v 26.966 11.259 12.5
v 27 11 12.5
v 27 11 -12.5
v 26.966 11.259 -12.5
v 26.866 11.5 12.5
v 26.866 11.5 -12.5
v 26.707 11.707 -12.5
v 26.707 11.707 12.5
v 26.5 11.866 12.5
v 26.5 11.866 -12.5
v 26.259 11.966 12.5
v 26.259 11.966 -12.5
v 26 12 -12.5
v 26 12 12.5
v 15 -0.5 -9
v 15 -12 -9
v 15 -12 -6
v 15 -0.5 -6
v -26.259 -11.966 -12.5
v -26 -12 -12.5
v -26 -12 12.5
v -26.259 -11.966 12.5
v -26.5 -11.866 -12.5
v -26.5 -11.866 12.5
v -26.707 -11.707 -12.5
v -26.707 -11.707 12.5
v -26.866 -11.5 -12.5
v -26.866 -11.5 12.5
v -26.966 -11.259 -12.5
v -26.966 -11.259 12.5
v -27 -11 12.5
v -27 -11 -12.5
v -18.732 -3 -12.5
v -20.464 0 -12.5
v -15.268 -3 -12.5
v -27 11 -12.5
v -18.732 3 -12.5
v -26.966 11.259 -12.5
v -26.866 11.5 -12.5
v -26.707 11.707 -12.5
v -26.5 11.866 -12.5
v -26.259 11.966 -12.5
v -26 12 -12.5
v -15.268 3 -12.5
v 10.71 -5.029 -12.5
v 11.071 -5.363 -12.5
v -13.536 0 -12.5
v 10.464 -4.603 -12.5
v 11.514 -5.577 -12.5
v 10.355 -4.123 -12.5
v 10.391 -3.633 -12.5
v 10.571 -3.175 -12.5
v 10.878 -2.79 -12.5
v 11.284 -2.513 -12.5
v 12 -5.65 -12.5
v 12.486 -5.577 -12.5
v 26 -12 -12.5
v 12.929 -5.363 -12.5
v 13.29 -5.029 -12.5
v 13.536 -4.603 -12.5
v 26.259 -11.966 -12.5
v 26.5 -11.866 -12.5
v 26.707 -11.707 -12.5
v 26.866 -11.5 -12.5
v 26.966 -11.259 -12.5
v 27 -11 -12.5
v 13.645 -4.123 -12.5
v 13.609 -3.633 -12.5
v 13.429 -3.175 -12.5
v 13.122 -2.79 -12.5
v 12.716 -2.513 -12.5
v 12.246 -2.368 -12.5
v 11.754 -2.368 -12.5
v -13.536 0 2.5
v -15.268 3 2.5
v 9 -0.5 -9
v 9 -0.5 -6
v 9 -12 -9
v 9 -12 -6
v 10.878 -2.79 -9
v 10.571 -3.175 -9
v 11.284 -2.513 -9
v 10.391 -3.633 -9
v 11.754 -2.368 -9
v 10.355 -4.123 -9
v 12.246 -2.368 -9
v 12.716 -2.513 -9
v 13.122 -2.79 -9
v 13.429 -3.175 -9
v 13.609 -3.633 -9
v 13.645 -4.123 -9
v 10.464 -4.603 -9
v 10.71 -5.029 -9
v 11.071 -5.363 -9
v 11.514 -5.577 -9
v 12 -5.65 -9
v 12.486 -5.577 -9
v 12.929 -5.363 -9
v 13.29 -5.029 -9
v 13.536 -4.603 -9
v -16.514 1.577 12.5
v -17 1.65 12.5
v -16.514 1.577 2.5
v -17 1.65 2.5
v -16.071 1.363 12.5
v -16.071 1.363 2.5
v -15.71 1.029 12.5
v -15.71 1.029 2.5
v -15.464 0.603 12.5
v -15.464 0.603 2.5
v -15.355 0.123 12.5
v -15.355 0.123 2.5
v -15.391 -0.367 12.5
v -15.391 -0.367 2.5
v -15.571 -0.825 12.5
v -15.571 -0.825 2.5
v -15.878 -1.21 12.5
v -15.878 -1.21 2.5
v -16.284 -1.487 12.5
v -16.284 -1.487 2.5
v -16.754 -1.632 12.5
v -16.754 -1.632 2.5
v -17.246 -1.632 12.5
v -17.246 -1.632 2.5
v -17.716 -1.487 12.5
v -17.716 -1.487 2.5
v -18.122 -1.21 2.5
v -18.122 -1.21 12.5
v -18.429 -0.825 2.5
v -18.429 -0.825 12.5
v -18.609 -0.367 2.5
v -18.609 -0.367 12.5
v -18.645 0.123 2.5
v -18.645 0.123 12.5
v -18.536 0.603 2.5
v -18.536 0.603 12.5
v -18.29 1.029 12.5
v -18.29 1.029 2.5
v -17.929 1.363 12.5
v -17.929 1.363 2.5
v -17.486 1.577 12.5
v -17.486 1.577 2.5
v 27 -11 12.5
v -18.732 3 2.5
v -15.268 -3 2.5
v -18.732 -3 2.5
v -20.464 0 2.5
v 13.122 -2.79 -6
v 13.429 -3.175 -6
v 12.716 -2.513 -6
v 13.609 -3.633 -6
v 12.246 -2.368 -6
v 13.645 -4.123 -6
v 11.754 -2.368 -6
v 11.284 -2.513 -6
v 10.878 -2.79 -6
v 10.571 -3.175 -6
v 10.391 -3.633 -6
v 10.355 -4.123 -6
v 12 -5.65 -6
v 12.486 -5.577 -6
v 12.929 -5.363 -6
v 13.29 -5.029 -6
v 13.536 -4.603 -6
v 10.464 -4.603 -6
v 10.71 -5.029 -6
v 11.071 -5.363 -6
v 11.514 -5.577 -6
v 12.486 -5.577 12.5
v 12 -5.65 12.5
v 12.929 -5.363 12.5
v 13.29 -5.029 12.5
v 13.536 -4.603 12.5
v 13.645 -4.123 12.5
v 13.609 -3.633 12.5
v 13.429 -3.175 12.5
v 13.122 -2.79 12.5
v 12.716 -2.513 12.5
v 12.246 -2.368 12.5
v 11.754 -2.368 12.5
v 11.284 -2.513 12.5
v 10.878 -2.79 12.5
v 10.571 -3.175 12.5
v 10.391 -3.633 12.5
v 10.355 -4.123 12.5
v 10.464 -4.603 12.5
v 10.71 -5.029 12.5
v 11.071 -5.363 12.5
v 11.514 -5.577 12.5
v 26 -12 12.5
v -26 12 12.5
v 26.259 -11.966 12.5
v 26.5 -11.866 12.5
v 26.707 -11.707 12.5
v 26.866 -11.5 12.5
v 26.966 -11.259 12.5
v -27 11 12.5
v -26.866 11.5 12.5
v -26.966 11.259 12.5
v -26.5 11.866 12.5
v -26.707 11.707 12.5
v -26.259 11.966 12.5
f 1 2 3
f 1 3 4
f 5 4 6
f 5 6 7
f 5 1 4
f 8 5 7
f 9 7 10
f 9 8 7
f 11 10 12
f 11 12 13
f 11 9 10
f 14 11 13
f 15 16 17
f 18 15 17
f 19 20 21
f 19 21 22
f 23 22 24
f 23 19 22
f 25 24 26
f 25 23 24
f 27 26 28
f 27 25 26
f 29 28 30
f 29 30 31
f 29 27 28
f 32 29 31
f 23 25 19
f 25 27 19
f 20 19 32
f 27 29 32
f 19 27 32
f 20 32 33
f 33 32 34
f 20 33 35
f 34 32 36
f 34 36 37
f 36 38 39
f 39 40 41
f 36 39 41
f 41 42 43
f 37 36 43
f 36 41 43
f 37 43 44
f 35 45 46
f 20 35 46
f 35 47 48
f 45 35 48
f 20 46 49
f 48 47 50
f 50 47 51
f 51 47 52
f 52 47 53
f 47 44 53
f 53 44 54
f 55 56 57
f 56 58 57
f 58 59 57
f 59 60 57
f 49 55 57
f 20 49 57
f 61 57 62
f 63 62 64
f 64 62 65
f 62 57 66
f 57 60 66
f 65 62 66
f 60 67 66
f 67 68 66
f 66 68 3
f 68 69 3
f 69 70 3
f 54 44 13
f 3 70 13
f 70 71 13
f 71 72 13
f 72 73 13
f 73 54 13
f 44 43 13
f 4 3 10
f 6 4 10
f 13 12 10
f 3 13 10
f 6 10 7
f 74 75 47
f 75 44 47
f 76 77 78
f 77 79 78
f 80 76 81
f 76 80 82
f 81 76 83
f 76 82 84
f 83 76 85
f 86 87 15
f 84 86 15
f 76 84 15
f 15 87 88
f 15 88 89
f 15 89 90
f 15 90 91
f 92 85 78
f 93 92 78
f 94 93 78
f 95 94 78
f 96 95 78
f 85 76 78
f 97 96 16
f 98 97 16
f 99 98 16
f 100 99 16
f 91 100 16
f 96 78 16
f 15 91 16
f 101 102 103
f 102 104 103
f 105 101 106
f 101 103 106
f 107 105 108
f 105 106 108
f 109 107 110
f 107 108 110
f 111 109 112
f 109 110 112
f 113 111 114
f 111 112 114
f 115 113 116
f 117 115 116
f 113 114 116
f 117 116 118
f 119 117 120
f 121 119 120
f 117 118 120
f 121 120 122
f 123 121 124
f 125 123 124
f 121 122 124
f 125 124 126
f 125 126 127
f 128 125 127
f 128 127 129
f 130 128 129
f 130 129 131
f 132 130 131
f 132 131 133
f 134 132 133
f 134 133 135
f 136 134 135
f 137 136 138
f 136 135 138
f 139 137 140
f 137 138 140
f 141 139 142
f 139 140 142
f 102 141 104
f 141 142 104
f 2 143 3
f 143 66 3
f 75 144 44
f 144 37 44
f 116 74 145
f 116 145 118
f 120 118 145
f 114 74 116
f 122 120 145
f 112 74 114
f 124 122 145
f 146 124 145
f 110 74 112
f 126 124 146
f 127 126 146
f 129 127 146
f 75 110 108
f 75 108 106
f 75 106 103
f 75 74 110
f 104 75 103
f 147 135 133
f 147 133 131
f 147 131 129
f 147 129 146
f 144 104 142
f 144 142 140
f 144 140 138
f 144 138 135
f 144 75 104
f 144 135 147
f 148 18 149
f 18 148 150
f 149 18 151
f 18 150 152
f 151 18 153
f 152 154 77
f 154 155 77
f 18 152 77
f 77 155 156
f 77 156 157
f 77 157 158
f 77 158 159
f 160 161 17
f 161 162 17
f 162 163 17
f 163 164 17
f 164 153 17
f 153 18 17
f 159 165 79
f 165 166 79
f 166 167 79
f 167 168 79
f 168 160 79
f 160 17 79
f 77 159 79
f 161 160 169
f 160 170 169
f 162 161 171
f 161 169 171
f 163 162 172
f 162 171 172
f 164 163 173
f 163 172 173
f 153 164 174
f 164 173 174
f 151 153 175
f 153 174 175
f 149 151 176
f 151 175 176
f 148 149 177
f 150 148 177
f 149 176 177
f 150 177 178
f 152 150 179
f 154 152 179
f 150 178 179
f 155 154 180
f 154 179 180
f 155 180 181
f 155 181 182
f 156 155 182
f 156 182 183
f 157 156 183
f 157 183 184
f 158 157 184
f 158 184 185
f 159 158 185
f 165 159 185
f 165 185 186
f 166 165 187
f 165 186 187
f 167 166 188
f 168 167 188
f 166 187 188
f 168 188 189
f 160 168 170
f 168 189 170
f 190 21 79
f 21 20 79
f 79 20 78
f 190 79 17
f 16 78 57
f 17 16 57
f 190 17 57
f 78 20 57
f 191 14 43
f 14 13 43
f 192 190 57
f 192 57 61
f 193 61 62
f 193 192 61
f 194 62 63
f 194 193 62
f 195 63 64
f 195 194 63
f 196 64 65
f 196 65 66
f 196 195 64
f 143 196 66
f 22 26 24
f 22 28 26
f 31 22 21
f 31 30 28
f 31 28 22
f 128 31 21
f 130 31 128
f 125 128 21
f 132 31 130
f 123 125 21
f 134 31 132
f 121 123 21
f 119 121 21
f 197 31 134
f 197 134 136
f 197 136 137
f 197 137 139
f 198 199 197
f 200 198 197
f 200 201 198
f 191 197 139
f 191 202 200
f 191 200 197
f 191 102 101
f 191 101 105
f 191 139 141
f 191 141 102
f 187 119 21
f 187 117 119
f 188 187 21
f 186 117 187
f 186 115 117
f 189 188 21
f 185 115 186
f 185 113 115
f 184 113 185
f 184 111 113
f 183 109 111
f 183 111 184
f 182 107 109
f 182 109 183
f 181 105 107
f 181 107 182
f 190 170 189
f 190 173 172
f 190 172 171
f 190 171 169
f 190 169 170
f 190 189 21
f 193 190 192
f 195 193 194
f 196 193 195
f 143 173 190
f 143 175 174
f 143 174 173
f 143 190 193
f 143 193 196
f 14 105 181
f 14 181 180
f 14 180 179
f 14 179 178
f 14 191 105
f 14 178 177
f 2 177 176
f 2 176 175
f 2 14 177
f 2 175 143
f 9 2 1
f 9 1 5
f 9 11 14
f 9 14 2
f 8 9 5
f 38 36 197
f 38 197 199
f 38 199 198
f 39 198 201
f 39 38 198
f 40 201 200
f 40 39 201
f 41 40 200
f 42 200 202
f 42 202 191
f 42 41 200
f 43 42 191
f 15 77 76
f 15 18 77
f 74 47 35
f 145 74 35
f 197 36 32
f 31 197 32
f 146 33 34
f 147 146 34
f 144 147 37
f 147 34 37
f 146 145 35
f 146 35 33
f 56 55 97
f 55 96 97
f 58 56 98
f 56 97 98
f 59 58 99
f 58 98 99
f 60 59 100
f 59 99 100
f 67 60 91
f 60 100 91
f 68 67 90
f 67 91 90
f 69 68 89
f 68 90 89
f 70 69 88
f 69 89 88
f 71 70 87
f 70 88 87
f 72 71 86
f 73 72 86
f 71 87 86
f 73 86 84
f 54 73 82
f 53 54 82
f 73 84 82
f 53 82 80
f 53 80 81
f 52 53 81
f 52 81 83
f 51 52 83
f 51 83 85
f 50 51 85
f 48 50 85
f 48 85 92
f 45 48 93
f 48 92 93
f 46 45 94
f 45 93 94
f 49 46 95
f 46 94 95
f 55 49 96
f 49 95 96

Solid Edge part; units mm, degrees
sketch "Sketch1" plane through (0, 0, 0) normal (0, 0, 1) x (1, 0, 0)
  line L0 (-27, -12) -> (27, -12)
  line L1 (27, -12) -> (27, 12)
  line L2 (27, 12) -> (-27, 12)
  line L3 (-27, 12) -> (-27, -12)
  dimension "D1" = 54
  dimension "D2" = 24
extrude "Ajout_matière_1" add sketch "Sketch1" along normal mid plane 25
fillet "Congé_1" radius 1 4 edges at (27, -12, 0) (27, 12, 0) (-27, -12, 0) (-27, 12, 0)
hole "Perçage_5" at (12, -4, 12.5) direction (0, 0, -1) diameter 3.3 end up to next
sketch "Sketch2" plane through (0, -12, 0) normal (0, -1, 0) x (0, 0, -1)
  line L0 (6, 9) -> (9, 9)
  line L1 (9, 9) -> (9, 15)
  line L2 (9, 15) -> (6, 15)
  line L3 (6, 15) -> (6, 9)
  dimension "D1" = 6
  dimension "D2" = 3
  dimension "D3" = 3.5
  dimension "D4" = 15
extrude "Enlèvement_matière_3" cut sketch "Sketch2" against normal blind 11.5
sketch "Sketch3" plane through (0, 0, -12.5) normal (0, 0, -1) x (0, 1, 0)
  line L0 (3, -15.2679) -> (0, -13.5359)
  line L1 (0, -13.5359) -> (-3, -15.2679)
  line L2 (-3, -15.2679) -> (-3, -18.7321)
  line L3 (-3, -18.7321) -> (0, -20.4641)
  line L4 (0, -20.4641) -> (3, -18.7321)
  line L5 (3, -18.7321) -> (3, -15.2679)
  dimension "D1" = 3.4641
  dimension "D2" = 3
  dimension "D3" = 6
  dimension "D4" = 10
extrude "Enlèvement_matière_5" cut sketch "Sketch3" against normal blind 15
hole "Perçage_6" at (-17, 0, 2.5) direction (0, 0, 1) diameter 3.3 end up to next
properties material "Plastique ABS, haute performance"
